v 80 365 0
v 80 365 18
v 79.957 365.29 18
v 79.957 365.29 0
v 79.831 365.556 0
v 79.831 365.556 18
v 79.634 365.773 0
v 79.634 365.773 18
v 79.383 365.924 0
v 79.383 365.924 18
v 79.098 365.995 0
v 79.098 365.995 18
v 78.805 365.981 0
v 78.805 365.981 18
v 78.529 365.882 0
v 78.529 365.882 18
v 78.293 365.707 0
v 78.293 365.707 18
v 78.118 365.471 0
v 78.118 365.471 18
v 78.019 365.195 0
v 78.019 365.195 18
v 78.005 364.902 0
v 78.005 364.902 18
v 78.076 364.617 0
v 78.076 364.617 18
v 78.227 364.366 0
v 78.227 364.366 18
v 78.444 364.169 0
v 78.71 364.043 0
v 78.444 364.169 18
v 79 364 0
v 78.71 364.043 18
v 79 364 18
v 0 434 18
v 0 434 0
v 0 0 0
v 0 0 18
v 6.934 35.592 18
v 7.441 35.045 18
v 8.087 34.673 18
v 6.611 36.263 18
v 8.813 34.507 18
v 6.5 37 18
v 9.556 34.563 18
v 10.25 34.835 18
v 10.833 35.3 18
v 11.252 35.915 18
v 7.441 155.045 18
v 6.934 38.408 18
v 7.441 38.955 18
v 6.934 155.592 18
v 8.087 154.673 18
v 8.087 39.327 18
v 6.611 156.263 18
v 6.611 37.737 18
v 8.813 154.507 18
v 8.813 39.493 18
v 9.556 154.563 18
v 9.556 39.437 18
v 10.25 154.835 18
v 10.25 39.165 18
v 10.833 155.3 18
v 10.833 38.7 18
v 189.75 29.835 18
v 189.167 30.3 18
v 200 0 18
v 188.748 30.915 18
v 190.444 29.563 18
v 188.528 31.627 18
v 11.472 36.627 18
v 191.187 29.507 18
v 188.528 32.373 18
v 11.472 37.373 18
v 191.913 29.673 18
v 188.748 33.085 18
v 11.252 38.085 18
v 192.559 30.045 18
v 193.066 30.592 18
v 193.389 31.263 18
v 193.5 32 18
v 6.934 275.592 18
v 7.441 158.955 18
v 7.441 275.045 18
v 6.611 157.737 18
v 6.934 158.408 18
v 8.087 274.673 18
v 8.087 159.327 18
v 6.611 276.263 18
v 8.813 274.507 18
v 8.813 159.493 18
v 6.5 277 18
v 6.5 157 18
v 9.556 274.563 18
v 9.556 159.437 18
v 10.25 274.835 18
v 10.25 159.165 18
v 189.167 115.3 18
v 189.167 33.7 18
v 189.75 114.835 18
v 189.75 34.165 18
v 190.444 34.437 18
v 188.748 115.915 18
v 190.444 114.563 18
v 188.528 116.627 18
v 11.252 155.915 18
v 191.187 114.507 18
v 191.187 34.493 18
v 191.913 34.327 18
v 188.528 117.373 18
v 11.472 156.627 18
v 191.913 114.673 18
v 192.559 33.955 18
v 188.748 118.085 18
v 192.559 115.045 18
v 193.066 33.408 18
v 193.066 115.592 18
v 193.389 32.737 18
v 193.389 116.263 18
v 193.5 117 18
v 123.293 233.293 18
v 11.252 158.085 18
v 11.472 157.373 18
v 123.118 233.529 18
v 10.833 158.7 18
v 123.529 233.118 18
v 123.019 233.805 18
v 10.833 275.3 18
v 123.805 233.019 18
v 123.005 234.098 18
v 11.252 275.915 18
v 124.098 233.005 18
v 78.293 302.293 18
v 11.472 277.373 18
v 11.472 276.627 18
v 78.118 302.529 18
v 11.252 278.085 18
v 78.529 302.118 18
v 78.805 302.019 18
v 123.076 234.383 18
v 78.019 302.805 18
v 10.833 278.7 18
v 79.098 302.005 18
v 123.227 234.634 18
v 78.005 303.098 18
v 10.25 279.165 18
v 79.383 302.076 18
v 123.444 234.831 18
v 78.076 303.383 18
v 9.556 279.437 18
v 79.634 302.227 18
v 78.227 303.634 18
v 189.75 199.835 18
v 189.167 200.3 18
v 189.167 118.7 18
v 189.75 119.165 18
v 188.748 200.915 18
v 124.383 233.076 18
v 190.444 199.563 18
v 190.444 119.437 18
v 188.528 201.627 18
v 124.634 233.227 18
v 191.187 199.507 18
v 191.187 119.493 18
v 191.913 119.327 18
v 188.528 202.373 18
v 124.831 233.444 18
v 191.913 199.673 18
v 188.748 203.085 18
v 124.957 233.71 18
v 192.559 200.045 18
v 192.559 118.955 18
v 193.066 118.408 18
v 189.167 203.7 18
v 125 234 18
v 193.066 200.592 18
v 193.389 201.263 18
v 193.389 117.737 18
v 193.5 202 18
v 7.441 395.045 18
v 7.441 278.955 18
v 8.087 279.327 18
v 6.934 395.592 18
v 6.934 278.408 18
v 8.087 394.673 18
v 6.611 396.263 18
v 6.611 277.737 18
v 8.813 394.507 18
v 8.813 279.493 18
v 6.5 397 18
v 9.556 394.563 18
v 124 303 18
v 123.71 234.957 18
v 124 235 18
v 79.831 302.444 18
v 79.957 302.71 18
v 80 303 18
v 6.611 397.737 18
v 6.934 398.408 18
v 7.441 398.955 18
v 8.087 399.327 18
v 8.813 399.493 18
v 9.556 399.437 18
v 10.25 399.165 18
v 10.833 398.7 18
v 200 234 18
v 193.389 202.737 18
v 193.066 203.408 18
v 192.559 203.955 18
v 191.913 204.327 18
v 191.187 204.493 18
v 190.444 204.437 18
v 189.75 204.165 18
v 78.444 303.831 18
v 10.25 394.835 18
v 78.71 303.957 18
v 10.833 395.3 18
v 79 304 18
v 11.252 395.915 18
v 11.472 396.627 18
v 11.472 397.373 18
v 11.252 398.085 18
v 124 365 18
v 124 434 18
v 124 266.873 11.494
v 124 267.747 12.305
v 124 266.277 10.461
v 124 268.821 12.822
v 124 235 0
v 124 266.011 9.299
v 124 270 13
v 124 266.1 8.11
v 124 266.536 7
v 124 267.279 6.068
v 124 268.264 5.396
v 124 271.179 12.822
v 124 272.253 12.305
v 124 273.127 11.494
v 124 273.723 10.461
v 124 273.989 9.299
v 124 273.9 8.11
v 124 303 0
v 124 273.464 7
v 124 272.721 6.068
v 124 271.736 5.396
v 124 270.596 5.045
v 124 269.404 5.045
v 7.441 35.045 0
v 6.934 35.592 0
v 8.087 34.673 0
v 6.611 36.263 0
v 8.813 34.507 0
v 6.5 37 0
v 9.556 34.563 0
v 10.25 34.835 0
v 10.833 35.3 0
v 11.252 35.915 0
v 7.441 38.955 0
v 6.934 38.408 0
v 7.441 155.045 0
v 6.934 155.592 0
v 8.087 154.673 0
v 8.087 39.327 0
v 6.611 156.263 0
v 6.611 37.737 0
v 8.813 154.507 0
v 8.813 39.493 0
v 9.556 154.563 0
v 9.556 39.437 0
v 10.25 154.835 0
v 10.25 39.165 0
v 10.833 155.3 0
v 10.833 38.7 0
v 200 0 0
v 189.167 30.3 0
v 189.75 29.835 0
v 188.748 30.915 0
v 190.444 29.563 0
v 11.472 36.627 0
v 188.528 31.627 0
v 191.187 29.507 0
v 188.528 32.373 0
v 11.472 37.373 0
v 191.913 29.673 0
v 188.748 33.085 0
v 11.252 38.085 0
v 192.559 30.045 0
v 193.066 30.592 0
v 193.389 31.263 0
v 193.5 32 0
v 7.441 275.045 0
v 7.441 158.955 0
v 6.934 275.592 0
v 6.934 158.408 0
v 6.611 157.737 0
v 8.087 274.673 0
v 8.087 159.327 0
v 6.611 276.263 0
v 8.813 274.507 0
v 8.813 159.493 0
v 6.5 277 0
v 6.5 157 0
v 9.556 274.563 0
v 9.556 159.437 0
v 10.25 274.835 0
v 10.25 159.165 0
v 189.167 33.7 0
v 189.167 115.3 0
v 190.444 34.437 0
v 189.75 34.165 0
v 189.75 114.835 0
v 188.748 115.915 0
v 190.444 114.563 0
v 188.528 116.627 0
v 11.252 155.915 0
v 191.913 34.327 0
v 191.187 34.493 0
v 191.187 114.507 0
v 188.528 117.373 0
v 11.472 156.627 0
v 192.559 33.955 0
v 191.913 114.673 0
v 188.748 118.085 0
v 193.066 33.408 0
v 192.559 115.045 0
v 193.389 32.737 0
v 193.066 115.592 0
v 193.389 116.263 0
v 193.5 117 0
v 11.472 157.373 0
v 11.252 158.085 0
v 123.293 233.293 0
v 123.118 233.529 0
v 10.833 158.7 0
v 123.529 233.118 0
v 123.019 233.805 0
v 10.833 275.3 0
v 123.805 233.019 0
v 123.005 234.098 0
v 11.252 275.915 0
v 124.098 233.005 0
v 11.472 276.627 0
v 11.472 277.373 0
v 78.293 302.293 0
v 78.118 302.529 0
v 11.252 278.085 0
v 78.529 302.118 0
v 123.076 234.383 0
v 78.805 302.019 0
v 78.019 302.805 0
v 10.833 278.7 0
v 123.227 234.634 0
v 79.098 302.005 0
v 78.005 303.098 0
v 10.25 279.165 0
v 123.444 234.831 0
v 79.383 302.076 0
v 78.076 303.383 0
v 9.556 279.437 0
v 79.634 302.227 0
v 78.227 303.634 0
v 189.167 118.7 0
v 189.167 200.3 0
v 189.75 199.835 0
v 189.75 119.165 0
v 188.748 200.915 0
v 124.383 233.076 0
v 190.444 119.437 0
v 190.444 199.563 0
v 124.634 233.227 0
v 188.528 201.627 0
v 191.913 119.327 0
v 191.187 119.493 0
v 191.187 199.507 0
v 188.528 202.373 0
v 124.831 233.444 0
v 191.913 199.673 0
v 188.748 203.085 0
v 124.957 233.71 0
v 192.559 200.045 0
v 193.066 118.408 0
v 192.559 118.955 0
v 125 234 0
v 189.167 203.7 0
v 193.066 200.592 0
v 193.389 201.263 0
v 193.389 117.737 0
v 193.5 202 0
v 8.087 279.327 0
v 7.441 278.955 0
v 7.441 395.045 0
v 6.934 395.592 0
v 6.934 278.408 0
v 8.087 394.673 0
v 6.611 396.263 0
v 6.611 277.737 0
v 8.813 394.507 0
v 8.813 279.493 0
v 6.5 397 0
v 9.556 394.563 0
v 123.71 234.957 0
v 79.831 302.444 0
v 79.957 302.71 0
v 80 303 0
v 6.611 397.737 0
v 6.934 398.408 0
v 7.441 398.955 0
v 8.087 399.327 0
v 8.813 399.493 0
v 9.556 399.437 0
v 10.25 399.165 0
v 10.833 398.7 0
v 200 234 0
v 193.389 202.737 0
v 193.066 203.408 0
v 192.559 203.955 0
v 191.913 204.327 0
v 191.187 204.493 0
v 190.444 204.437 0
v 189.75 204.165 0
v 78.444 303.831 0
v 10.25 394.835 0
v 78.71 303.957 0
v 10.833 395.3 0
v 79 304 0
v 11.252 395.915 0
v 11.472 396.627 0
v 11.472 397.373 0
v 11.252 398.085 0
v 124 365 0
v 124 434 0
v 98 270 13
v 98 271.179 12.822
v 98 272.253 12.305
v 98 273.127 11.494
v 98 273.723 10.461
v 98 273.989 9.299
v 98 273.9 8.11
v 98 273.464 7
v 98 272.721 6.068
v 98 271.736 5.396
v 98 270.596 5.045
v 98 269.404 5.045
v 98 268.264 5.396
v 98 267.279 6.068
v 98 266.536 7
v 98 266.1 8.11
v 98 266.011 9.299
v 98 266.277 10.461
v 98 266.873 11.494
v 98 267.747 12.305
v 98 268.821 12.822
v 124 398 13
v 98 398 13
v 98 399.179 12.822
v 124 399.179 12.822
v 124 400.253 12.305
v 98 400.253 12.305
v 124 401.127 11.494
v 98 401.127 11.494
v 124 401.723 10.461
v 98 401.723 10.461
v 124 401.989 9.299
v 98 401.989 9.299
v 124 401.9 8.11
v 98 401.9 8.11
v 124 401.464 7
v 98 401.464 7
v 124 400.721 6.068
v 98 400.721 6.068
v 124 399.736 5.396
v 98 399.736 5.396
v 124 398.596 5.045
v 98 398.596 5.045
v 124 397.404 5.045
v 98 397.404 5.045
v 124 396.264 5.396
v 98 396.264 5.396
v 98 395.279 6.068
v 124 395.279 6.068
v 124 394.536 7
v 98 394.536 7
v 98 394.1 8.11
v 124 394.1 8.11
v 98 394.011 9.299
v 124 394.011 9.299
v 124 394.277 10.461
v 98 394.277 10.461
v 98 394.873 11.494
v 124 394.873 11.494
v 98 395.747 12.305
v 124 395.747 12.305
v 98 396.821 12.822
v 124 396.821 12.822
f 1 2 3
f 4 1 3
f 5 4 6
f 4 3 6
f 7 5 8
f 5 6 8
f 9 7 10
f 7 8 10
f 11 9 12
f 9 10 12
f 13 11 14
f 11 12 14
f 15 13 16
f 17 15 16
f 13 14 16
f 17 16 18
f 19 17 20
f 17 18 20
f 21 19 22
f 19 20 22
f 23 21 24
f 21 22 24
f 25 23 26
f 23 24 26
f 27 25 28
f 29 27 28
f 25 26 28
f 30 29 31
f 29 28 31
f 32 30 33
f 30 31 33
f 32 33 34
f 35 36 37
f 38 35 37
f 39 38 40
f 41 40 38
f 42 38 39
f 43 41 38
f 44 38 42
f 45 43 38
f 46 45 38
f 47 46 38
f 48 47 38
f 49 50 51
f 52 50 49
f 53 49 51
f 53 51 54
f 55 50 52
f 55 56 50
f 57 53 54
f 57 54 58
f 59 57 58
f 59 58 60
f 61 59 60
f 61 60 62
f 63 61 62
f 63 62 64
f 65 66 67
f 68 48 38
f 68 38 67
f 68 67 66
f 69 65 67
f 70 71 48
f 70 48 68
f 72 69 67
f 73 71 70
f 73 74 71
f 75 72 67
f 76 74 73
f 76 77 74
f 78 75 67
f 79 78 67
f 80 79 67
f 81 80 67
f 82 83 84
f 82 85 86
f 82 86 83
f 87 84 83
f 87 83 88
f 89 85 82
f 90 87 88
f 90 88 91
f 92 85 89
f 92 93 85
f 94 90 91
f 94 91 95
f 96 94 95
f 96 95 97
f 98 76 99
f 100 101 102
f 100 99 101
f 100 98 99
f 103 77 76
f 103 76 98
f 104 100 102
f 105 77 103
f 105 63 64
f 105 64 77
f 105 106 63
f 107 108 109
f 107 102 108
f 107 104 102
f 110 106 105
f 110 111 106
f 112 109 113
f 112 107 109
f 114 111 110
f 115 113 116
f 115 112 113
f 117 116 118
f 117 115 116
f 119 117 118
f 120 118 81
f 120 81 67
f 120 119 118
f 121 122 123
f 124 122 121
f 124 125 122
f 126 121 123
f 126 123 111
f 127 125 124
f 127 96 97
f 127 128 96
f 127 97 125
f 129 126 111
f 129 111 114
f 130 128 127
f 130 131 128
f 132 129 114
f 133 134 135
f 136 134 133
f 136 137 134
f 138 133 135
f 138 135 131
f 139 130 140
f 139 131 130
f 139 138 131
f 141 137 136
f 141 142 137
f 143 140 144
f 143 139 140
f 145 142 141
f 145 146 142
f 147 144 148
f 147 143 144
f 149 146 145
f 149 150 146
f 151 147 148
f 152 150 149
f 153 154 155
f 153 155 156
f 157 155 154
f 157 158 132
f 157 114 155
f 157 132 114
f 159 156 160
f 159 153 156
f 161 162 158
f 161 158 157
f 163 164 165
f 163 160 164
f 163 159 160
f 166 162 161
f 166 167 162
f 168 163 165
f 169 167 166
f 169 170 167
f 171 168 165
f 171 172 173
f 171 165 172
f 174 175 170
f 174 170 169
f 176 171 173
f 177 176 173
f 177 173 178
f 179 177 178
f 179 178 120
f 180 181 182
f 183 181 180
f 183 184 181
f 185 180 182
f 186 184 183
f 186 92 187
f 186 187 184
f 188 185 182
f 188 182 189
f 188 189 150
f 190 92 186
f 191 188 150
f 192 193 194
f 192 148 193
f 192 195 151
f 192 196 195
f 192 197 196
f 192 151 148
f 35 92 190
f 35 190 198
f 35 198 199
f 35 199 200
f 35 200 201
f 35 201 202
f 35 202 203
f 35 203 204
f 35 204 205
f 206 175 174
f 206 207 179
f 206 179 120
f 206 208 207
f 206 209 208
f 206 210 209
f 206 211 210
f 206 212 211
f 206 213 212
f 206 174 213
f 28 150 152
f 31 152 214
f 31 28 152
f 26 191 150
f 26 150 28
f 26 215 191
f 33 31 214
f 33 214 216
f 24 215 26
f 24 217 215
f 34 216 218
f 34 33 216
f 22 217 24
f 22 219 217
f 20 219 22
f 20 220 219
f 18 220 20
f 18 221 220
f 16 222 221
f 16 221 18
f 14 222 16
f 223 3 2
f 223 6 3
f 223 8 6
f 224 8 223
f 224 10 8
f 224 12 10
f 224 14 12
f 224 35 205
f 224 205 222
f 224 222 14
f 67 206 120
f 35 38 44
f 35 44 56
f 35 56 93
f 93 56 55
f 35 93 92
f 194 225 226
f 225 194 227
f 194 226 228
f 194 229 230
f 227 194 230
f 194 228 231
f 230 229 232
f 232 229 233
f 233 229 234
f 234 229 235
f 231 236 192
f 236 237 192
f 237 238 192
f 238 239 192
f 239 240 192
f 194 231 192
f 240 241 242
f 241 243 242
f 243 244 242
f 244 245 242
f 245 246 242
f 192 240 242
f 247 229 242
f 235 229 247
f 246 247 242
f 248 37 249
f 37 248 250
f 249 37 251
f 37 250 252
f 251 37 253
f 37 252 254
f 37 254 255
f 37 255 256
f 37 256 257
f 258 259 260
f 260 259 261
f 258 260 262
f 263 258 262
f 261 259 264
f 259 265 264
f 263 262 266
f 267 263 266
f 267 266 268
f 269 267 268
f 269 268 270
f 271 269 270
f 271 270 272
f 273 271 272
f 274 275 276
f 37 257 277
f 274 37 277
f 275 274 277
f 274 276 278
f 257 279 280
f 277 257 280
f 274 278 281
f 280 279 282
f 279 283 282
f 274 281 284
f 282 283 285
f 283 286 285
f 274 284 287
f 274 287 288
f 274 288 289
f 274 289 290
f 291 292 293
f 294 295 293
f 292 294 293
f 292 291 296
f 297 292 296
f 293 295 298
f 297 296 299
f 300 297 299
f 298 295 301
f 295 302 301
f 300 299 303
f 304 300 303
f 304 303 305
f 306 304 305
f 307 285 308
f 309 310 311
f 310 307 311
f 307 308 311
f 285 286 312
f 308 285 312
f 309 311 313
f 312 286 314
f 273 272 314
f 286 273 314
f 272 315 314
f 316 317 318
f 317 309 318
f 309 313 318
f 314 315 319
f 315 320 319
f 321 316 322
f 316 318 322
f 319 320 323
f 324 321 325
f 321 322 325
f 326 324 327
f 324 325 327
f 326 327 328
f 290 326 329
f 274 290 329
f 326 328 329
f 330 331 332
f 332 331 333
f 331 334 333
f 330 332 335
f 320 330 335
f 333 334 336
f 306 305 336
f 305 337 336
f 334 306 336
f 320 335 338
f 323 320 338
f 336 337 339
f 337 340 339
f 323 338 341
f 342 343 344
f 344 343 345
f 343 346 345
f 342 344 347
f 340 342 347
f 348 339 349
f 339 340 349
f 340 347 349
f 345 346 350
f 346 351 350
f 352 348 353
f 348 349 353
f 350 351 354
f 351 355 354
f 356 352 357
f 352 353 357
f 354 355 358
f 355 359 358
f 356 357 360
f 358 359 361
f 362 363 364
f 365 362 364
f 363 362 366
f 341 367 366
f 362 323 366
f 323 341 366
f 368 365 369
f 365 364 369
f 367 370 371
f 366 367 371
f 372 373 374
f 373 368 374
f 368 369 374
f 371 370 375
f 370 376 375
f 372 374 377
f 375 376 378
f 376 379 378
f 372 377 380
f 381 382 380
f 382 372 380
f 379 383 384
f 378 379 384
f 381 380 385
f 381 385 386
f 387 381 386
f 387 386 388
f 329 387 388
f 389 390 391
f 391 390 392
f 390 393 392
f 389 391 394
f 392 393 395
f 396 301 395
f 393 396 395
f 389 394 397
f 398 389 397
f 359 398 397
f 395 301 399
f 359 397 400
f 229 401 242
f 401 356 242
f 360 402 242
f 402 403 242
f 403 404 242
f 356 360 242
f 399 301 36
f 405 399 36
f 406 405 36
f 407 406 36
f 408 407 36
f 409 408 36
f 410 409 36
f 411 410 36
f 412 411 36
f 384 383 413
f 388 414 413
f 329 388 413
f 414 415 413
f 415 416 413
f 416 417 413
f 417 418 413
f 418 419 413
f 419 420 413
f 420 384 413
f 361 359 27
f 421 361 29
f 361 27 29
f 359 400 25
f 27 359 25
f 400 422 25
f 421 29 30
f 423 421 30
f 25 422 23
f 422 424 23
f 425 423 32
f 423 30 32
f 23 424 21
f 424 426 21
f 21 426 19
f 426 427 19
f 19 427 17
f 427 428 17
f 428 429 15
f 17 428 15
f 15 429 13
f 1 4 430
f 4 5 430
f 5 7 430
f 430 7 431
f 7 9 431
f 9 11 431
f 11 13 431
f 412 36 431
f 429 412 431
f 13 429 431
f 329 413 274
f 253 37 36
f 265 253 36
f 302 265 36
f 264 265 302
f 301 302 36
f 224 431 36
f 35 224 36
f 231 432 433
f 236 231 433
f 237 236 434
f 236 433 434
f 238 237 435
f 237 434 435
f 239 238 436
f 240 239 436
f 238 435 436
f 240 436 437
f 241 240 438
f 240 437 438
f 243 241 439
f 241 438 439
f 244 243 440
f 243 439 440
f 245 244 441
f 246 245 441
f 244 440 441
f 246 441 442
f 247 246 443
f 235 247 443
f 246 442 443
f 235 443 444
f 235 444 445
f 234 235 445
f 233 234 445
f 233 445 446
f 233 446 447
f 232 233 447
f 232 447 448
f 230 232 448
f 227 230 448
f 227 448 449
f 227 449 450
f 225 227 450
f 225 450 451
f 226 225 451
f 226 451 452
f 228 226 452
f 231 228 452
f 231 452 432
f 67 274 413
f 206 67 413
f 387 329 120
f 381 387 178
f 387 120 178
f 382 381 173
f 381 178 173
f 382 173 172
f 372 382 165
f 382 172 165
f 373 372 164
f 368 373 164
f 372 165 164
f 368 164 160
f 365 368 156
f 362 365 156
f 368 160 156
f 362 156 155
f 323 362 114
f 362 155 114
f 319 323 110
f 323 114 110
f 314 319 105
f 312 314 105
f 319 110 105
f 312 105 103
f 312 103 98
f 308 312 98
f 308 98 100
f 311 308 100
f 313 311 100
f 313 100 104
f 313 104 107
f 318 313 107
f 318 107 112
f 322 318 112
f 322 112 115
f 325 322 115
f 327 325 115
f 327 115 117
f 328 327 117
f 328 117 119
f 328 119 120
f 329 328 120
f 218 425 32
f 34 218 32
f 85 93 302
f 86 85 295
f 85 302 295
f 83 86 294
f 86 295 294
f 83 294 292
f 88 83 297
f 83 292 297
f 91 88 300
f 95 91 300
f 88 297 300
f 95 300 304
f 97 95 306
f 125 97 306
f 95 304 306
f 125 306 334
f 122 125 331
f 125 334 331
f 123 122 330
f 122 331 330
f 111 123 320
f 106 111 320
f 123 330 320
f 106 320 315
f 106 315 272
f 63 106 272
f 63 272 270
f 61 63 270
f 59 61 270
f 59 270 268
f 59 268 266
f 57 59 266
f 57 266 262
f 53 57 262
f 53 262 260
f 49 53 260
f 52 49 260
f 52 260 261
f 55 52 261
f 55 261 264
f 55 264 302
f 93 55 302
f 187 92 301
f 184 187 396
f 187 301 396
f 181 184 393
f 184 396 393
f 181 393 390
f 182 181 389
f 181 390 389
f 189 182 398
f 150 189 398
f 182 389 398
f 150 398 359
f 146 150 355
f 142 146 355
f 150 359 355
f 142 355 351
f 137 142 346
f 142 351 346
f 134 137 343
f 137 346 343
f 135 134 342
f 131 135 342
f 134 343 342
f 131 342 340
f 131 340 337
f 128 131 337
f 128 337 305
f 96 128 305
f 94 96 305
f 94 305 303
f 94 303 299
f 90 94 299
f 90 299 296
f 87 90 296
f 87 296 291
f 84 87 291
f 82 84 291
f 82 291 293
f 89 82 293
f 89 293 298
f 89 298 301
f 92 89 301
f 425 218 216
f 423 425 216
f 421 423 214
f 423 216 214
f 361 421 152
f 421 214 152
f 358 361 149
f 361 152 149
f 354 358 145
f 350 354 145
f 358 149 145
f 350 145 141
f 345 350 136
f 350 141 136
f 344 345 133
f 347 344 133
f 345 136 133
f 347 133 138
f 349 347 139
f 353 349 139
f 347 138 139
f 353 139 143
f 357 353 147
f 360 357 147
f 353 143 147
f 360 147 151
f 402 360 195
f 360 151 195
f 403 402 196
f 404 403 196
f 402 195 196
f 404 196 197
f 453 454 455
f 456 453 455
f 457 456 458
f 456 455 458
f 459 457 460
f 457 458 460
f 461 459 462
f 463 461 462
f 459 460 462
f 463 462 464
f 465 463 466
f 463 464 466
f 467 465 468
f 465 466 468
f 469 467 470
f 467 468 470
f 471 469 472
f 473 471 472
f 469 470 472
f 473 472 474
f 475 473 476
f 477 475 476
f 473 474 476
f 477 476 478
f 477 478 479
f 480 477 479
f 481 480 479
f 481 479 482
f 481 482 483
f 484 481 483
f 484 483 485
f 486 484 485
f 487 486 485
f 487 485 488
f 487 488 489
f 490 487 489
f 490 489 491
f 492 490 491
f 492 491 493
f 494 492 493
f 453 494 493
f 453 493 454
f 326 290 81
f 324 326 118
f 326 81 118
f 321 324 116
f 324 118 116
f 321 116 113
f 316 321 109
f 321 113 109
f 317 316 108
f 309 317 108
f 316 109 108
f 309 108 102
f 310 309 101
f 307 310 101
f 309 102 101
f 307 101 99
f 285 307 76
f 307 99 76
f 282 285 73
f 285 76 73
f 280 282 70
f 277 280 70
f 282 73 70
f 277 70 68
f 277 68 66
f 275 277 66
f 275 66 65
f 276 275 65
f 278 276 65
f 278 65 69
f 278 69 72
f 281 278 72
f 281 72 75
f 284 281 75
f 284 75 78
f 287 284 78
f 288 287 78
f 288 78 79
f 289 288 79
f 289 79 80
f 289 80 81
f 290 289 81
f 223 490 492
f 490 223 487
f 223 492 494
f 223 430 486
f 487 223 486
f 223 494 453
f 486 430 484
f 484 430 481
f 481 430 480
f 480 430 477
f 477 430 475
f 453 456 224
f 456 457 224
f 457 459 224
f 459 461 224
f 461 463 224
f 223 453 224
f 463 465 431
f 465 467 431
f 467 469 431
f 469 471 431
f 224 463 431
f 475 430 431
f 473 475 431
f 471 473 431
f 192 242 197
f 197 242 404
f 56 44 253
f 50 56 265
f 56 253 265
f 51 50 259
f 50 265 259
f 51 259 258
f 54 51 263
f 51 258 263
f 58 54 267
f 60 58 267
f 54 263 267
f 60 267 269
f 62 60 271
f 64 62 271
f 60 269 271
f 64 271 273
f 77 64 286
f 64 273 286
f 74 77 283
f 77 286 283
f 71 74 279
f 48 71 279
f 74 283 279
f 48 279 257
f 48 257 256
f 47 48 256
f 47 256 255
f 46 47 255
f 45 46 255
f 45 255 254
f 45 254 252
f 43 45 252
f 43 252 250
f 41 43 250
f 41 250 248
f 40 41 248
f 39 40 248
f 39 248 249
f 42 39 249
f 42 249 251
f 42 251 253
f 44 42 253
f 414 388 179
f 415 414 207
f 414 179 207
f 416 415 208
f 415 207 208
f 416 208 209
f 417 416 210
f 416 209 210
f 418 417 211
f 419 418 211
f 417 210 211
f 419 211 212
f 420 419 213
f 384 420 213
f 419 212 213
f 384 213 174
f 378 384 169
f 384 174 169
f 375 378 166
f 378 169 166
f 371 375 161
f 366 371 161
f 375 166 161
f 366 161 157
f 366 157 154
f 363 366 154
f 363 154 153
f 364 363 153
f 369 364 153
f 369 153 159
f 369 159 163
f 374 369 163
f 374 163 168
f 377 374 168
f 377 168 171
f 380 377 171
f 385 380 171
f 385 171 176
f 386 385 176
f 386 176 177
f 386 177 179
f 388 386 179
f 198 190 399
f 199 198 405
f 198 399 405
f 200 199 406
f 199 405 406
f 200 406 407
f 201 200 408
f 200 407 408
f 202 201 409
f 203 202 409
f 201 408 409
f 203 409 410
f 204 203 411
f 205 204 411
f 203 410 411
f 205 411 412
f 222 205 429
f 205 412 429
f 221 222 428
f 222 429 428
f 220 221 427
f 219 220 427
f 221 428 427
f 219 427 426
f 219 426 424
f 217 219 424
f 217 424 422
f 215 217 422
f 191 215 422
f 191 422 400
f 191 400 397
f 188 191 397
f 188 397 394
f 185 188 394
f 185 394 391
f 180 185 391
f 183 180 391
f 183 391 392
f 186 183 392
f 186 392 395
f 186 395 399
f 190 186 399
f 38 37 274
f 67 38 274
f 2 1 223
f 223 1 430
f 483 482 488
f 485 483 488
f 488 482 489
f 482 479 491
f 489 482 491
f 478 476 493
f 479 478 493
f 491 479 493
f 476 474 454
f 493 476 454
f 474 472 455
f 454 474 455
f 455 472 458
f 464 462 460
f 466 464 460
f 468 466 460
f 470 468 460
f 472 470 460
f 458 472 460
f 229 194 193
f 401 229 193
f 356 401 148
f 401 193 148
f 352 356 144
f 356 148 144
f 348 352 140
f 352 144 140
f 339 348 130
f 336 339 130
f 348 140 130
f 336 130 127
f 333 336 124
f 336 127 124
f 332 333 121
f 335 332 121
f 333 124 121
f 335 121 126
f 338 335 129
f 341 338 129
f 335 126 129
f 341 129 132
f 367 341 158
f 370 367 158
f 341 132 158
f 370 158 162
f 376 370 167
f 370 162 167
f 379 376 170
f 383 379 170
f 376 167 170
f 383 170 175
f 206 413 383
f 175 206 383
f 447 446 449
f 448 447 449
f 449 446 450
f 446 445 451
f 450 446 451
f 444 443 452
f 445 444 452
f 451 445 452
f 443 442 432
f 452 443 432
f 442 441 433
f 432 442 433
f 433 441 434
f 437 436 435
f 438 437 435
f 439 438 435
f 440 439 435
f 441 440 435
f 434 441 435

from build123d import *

# Parameters (mm, degrees)
BOSS_EXTRUDE1_DEPTH          = 18
SKETCH2_R                    = 1
CUT_EXTRUDE1_DEPTH           = 18
F_5_0_5_DIAMETER_HOLE1_D     = 5
F_5_0_5_DIAMETER_HOLE2_D     = 5
F_8_0_8_DIAMETER_HOLE1_D     = 8
F_8_0_8_DIAMETER_HOLE1_DEPTH = 26


with BuildPart() as part:
    # Sketch1 → Boss-Extrude1 (new body)
    with BuildSketch(Plane.XY):
        Polygon((200, 234), (124, 234), (124, 303), (79, 303), (79, 365), (124, 365), (124, 434), (0, 434), (0, 0), (200, 0), align=None)
    extrude(amount=BOSS_EXTRUDE1_DEPTH)

    # Sketch2 → Cut-Extrude1 (cut)
    with BuildSketch(Plane.XY.offset(18)):
        with Locations((79, 365)):
            Circle(SKETCH2_R)
        with Locations((79, 303)):
            Circle(SKETCH2_R)
        with Locations((124, 234)):
            Circle(SKETCH2_R)
    extrude(amount=-CUT_EXTRUDE1_DEPTH, mode=Mode.SUBTRACT)

    # Ø5.0 (5) Diameter Hole1 (through all)
    with Locations(Plane.XY.offset(18)):
        with Locations((9, 397), (9, 277), (9, 157), (9, 37)):
            Hole(F_5_0_5_DIAMETER_HOLE1_D / 2)

    # Ø5.0 (5) Diameter Hole2 (through all)
    with Locations(Plane(origin=(0, 0, 0), x_dir=(-1, 0, 0), z_dir=(0, 0, -1))):
        with Locations((-191, 202), (-191, 117), (-191, 32)):
            Hole(F_5_0_5_DIAMETER_HOLE2_D / 2)

    # Ø8.0 (8) Diameter Hole1
    with Locations(Plane(origin=(124, 0, 0), x_dir=(0, 0, -1), z_dir=(1, 0, 0))):
        with Locations((-9, 398), (-9, 270)):
            Hole(F_8_0_8_DIAMETER_HOLE1_D / 2, depth=F_8_0_8_DIAMETER_HOLE1_DEPTH)


solid = part.part
